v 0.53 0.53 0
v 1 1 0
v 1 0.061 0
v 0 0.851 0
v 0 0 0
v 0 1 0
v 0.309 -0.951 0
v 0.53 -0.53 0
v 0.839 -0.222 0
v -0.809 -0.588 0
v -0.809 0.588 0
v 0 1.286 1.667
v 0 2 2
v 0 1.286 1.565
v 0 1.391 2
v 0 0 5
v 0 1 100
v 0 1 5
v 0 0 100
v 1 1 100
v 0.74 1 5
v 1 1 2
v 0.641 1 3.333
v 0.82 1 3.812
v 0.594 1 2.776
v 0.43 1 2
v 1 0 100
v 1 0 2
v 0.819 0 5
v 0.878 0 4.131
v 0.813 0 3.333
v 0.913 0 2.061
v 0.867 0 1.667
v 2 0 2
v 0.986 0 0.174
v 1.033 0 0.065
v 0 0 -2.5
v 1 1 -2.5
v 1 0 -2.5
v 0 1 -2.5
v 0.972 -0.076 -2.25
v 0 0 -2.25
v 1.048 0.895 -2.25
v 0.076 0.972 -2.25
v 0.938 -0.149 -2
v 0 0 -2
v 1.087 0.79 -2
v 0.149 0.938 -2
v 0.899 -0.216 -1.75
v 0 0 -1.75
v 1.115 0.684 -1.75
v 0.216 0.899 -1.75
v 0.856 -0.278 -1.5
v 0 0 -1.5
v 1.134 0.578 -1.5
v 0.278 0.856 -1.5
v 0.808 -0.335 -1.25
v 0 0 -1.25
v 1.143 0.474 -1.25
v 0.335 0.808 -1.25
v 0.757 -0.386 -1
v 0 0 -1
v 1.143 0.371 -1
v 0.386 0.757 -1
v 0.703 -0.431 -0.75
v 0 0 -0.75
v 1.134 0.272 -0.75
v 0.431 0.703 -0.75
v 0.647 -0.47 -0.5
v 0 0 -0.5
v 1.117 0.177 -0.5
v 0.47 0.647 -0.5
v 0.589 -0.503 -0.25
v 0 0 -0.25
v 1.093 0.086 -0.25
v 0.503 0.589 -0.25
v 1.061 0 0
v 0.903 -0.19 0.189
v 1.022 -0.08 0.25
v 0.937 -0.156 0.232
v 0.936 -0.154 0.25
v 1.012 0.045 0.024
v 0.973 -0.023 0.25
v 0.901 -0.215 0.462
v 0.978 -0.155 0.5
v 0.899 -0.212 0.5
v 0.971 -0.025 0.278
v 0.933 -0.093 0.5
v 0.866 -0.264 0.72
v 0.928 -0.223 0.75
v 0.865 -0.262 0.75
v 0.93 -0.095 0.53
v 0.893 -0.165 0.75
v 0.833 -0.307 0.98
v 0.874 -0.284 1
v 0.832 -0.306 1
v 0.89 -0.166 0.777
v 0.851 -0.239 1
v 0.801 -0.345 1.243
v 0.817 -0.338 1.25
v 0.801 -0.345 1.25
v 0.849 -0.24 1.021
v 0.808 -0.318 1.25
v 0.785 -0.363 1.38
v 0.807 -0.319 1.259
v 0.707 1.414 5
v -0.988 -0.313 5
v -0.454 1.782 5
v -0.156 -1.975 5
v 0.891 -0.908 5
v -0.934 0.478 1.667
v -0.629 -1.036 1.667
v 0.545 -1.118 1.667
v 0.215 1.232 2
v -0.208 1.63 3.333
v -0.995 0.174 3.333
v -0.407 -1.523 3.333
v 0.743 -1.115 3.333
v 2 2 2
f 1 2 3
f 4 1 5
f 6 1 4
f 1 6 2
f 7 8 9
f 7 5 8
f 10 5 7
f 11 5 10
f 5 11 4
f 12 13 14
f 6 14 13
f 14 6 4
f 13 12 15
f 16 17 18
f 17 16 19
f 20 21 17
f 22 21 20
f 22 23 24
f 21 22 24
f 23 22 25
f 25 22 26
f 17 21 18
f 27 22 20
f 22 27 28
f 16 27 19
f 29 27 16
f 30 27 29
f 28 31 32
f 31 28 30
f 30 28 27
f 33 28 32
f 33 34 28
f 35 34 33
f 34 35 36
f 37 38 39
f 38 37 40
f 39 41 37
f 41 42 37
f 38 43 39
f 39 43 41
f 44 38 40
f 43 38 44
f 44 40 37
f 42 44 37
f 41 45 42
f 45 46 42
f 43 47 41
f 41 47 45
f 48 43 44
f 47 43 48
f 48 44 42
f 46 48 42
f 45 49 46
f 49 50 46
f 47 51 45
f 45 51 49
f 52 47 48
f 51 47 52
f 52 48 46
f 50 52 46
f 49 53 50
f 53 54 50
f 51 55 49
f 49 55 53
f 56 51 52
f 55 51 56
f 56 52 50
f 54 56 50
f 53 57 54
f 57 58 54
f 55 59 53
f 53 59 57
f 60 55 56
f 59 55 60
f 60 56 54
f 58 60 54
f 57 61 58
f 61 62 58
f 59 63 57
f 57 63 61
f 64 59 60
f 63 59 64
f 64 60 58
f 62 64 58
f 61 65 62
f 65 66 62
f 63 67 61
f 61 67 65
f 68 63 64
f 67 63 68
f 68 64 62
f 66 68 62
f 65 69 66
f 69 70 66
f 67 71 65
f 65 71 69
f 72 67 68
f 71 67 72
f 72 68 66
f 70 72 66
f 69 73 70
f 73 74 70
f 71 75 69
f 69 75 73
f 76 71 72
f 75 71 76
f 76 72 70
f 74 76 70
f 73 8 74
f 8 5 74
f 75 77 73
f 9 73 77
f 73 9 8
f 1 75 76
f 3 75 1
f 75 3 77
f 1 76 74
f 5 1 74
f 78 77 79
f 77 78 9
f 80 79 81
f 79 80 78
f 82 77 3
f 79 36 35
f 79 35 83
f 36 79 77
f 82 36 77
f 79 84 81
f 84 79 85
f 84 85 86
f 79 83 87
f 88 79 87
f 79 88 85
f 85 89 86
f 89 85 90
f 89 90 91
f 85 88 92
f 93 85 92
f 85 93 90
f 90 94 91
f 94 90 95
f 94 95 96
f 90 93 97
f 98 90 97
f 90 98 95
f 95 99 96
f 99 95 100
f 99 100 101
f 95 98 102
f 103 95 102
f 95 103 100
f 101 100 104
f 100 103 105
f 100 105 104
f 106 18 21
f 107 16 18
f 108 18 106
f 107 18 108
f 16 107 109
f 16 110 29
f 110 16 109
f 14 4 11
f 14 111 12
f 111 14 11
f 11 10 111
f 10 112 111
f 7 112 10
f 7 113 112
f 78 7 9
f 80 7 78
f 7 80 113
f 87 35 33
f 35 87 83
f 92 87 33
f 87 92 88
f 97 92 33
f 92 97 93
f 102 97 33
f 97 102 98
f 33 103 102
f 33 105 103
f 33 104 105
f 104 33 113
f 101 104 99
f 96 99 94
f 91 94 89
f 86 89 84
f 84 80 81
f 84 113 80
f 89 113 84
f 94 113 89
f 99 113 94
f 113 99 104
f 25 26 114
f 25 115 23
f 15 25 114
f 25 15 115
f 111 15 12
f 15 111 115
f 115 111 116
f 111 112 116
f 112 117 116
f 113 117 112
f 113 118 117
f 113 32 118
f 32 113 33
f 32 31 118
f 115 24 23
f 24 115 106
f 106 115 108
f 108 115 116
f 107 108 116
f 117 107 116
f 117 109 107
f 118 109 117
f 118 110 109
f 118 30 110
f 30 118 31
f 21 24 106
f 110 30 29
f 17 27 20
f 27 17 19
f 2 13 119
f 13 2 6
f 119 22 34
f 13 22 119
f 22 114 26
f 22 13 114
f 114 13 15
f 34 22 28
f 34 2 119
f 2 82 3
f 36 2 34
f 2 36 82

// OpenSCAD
linear_extrude(10) square();
linear_extrude(height = 5, center = true, convexity = 10, twist = 90, slices = 20, scale = 0.5, $fn = 16) square();
linear_extrude(height = 5, scale = [1, 2], twist = -45) circle();
linear_extrude() square();
linear_extrude(height = 2, center = false, twist = 0, scale = 1, convexity = 1, slices = 1) square();
linear_extrude(height = 2, scale = [1, 1]) square();
linear_extrude(height = 2, scale = [2, 2]) square();
linear_extrude(height = 2, convexity = 2, $fn = 5, $fa = 6, $fs = 0.5) square();
